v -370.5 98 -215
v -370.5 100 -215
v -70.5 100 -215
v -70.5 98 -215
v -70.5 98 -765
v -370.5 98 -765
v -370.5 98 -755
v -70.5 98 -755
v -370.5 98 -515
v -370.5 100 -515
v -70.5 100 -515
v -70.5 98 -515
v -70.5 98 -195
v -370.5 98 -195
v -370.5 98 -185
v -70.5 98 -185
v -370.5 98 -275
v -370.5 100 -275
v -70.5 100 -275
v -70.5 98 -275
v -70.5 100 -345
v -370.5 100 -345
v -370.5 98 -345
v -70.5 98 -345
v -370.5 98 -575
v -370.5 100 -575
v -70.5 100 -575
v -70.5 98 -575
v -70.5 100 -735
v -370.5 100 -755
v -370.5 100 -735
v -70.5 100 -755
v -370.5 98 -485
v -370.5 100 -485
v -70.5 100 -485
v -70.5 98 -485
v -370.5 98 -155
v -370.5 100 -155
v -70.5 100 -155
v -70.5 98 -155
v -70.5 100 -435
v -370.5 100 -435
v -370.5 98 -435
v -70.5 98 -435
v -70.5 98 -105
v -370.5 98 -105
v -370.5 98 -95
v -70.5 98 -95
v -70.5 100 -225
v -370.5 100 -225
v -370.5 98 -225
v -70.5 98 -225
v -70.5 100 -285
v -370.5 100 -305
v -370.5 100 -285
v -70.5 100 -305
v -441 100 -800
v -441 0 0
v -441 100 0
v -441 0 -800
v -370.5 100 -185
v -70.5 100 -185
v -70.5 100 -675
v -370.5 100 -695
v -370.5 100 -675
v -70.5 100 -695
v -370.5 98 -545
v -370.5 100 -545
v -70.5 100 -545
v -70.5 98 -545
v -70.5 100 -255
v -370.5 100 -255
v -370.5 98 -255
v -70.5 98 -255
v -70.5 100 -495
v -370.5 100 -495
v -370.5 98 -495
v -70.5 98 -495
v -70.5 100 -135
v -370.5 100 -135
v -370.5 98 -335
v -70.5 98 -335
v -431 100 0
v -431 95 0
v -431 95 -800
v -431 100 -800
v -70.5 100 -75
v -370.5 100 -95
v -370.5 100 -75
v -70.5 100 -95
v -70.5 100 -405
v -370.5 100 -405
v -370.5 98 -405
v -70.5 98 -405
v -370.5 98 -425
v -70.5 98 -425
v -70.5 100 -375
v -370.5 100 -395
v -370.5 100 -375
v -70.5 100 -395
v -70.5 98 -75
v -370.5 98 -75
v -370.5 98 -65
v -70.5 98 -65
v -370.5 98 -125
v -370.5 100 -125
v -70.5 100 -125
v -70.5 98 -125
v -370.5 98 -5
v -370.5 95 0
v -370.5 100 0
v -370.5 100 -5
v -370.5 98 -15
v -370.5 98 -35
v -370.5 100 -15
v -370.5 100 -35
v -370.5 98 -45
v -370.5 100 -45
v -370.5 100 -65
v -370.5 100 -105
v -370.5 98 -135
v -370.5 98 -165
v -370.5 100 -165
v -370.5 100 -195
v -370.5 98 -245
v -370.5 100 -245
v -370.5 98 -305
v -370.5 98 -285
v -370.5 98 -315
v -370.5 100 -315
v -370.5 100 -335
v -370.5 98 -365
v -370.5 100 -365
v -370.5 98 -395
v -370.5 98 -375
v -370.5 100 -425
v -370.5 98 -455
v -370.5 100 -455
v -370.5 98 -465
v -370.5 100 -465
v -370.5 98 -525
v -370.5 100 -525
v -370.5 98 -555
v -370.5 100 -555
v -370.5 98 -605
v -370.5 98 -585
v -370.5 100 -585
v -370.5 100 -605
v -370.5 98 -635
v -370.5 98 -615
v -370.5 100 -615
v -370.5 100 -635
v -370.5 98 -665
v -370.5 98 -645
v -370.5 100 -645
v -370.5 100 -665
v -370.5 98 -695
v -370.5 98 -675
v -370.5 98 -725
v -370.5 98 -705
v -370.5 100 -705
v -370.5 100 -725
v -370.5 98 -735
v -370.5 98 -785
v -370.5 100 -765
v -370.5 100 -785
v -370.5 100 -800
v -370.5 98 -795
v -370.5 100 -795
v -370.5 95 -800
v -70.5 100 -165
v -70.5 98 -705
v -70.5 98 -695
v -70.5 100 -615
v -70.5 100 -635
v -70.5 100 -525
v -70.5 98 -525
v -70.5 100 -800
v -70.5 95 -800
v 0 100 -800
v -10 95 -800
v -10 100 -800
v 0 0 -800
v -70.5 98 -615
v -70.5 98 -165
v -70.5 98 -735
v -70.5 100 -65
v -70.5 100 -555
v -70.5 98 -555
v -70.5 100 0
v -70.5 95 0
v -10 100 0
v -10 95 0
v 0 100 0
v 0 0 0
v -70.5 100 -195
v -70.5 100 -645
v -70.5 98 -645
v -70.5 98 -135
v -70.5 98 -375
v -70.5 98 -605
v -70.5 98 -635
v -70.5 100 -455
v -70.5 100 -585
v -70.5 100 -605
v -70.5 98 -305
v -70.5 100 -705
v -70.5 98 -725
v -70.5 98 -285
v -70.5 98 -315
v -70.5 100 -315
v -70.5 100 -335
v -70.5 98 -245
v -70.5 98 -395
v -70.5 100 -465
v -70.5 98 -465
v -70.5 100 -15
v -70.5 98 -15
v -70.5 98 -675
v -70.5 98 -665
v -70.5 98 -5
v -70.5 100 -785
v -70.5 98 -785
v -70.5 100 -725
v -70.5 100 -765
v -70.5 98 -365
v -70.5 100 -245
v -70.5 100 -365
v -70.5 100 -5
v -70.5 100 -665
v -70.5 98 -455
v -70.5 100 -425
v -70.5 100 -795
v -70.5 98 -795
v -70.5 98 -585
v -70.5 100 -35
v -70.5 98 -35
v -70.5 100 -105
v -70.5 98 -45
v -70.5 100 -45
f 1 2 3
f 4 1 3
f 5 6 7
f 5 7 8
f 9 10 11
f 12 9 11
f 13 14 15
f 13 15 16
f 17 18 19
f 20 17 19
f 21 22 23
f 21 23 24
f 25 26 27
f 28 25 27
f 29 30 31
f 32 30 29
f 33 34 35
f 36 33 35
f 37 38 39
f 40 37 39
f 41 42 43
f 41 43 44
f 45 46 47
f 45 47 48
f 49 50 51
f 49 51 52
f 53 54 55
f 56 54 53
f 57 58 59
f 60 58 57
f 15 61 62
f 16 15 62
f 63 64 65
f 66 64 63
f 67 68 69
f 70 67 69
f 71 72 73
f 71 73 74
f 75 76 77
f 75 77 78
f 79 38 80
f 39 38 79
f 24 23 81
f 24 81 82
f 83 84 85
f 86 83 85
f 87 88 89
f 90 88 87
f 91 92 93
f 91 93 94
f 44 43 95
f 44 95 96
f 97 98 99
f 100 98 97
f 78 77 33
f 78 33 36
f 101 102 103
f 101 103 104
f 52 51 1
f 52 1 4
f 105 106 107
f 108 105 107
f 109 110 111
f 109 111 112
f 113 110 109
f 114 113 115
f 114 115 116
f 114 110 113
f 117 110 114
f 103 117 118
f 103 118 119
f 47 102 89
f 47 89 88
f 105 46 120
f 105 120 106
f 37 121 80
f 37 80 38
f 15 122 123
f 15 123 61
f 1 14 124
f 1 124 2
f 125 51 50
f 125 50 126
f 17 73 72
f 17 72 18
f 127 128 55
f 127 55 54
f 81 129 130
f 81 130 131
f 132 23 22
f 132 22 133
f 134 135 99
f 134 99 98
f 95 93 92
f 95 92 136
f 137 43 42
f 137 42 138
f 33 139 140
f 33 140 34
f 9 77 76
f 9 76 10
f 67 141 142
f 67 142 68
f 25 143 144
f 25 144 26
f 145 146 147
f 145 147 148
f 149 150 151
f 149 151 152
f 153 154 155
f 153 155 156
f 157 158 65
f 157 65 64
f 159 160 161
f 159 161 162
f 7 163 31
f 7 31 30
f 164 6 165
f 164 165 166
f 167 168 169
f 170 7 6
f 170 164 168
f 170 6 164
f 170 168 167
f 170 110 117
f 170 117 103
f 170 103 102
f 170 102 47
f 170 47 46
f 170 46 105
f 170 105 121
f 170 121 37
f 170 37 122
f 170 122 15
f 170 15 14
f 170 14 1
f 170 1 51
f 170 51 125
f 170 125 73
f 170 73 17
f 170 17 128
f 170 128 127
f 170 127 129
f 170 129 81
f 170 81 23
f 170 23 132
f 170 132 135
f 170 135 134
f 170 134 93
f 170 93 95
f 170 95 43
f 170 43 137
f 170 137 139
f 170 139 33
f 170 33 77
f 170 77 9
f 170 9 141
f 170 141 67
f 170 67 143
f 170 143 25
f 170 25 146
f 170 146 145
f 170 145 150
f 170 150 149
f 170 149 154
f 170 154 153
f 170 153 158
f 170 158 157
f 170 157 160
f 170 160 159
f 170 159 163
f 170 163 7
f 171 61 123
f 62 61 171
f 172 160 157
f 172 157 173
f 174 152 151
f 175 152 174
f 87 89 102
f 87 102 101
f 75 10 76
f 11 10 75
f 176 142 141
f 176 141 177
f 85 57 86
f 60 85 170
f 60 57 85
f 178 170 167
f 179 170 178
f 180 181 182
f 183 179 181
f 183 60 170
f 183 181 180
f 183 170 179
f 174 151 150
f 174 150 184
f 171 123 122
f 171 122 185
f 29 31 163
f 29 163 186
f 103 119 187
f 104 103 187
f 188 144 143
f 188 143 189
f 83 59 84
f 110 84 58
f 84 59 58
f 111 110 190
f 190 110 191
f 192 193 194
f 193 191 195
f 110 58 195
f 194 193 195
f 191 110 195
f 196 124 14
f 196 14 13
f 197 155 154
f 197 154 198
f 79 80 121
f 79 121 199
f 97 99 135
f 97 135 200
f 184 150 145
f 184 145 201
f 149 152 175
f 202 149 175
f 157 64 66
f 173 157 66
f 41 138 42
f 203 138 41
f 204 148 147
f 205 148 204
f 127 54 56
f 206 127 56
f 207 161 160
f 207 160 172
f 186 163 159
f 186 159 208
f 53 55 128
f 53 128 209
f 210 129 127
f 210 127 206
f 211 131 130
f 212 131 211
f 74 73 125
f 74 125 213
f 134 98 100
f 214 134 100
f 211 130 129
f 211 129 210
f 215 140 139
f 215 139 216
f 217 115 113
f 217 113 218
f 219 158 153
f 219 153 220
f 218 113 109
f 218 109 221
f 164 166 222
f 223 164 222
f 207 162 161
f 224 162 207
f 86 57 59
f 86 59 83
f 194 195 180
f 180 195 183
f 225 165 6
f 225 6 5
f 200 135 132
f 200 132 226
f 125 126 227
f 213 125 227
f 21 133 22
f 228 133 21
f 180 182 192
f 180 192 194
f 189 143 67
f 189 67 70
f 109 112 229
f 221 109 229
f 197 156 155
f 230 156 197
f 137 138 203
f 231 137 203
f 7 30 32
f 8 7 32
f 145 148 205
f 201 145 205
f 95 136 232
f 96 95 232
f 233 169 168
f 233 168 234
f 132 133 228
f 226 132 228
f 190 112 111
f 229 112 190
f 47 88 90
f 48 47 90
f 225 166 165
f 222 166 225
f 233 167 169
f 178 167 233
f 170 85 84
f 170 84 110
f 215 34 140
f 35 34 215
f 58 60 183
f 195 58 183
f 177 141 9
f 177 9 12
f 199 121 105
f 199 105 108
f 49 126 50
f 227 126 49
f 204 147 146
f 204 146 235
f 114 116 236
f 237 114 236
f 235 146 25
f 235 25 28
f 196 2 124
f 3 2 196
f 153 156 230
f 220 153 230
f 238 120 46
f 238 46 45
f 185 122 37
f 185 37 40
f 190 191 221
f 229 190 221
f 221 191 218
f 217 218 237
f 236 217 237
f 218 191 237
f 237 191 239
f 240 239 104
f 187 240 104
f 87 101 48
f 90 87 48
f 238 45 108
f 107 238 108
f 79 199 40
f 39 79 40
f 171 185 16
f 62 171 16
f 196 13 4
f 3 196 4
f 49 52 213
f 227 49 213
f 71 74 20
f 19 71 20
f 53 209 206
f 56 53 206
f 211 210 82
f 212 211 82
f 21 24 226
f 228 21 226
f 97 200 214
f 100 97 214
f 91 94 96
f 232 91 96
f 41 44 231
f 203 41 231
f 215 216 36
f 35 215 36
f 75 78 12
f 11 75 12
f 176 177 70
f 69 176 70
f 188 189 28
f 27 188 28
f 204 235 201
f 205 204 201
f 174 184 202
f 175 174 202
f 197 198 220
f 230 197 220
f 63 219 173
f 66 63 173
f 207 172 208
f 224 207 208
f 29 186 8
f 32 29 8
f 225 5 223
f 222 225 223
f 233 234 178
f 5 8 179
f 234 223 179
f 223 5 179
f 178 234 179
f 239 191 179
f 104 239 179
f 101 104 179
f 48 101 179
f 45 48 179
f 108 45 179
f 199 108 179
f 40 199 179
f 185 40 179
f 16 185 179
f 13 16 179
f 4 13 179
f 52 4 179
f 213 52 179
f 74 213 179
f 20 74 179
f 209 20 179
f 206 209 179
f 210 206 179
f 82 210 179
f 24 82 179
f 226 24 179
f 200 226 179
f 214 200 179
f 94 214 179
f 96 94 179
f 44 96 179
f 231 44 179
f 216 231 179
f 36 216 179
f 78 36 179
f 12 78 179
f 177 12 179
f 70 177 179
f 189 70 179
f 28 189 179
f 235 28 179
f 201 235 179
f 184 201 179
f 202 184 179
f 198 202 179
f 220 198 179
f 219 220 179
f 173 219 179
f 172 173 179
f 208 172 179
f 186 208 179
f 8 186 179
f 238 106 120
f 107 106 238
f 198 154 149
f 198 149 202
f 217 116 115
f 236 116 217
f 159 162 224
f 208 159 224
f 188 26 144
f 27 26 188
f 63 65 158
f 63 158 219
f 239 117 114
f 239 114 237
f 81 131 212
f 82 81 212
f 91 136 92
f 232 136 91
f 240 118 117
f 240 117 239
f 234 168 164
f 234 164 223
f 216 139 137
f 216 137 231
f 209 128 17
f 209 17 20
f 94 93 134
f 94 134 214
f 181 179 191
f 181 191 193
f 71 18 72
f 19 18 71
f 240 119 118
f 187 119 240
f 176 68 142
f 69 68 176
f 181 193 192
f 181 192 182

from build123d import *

# Parameters (mm, degrees)
SKETCH_1_W          = 441
SKETCH_1_H          = 800
EXTRUDE_1_DEPTH     = 95
SKETCH_3_W          = 10
SKETCH_3_H          = 800
SKETCH_3_W_2        = 300
EXTRUDE_2_DEPTH     = 5
SKETCH_4_W          = 300
SKETCH_4_H          = 10
CUT_EXTRUDE_1_DEPTH = 2


with BuildPart() as part:
    # 草图1 → 凸台-拉伸1 (new body)
    with BuildSketch(Plane(origin=(0, 0, 0), x_dir=(1, 0, 0), z_dir=(0, 1, 0))):
        with Locations((-220.5, 400)):
            Rectangle(SKETCH_1_W, SKETCH_1_H)
    extrude(amount=EXTRUDE_1_DEPTH)

    # 草图3 → 凸台-拉伸2 (add)
    with BuildSketch(Plane(origin=(0, 95, 0), x_dir=(1, 0, 0), z_dir=(0, 1, 0))):
        with Locations((-436, 400)):
            Rectangle(SKETCH_3_W, SKETCH_3_H)
        with Locations((-220.5, 400)):
            Rectangle(SKETCH_3_W_2, SKETCH_3_H)
        with Locations((-5, 400)):
            Rectangle(SKETCH_3_W, SKETCH_3_H)
    extrude(amount=EXTRUDE_2_DEPTH)

    # 草图4 → 切除-拉伸1 (cut)
    with BuildSketch(Plane(origin=(0, 100, 0), x_dir=(1, 0, 0), z_dir=(0, 1, 0))):
        with Locations((-220.5, 790)):
            Rectangle(SKETCH_4_W, SKETCH_4_H)
        with Locations((-220.5, 760)):
            Rectangle(SKETCH_4_W, SKETCH_4_H)
        with Locations((-220.5, 730)):
            Rectangle(SKETCH_4_W, SKETCH_4_H)
        with Locations((-220.5, 700)):
            Rectangle(SKETCH_4_W, SKETCH_4_H)
        with Locations((-220.5, 670)):
            Rectangle(SKETCH_4_W, SKETCH_4_H)
        with Locations((-220.5, 640)):
            Rectangle(SKETCH_4_W, SKETCH_4_H)
        with Locations((-220.5, 610)):
            Rectangle(SKETCH_4_W, SKETCH_4_H)
        with Locations((-220.5, 580)):
            Rectangle(SKETCH_4_W, SKETCH_4_H)
        with Locations((-220.5, 550)):
            Rectangle(SKETCH_4_W, SKETCH_4_H)
        with Locations((-220.5, 520)):
            Rectangle(SKETCH_4_W, SKETCH_4_H)
        with Locations((-220.5, 490)):
            Rectangle(SKETCH_4_W, SKETCH_4_H)
        with Locations((-220.5, 460)):
            Rectangle(SKETCH_4_W, SKETCH_4_H)
        with Locations((-220.5, 430)):
            Rectangle(SKETCH_4_W, SKETCH_4_H)
        with Locations((-220.5, 400)):
            Rectangle(SKETCH_4_W, SKETCH_4_H)
        with Locations((-220.5, 370)):
            Rectangle(SKETCH_4_W, SKETCH_4_H)
        with Locations((-220.5, 340)):
            Rectangle(SKETCH_4_W, SKETCH_4_H)
        with Locations((-220.5, 310)):
            Rectangle(SKETCH_4_W, SKETCH_4_H)
        with Locations((-220.5, 280)):
            Rectangle(SKETCH_4_W, SKETCH_4_H)
        with Locations((-220.5, 250)):
            Rectangle(SKETCH_4_W, SKETCH_4_H)
        with Locations((-220.5, 220)):
            Rectangle(SKETCH_4_W, SKETCH_4_H)
        with Locations((-220.5, 190)):
            Rectangle(SKETCH_4_W, SKETCH_4_H)
        with Locations((-220.5, 160)):
            Rectangle(SKETCH_4_W, SKETCH_4_H)
        with Locations((-220.5, 130)):
            Rectangle(SKETCH_4_W, SKETCH_4_H)
        with Locations((-220.5, 100)):
            Rectangle(SKETCH_4_W, SKETCH_4_H)
        with Locations((-220.5, 70)):
            Rectangle(SKETCH_4_W, SKETCH_4_H)
        with Locations((-220.5, 40)):
            Rectangle(SKETCH_4_W, SKETCH_4_H)
        with Locations((-220.5, 10)):
            Rectangle(SKETCH_4_W, SKETCH_4_H)
    extrude(amount=-CUT_EXTRUDE_1_DEPTH, mode=Mode.SUBTRACT)


solid = part.part
